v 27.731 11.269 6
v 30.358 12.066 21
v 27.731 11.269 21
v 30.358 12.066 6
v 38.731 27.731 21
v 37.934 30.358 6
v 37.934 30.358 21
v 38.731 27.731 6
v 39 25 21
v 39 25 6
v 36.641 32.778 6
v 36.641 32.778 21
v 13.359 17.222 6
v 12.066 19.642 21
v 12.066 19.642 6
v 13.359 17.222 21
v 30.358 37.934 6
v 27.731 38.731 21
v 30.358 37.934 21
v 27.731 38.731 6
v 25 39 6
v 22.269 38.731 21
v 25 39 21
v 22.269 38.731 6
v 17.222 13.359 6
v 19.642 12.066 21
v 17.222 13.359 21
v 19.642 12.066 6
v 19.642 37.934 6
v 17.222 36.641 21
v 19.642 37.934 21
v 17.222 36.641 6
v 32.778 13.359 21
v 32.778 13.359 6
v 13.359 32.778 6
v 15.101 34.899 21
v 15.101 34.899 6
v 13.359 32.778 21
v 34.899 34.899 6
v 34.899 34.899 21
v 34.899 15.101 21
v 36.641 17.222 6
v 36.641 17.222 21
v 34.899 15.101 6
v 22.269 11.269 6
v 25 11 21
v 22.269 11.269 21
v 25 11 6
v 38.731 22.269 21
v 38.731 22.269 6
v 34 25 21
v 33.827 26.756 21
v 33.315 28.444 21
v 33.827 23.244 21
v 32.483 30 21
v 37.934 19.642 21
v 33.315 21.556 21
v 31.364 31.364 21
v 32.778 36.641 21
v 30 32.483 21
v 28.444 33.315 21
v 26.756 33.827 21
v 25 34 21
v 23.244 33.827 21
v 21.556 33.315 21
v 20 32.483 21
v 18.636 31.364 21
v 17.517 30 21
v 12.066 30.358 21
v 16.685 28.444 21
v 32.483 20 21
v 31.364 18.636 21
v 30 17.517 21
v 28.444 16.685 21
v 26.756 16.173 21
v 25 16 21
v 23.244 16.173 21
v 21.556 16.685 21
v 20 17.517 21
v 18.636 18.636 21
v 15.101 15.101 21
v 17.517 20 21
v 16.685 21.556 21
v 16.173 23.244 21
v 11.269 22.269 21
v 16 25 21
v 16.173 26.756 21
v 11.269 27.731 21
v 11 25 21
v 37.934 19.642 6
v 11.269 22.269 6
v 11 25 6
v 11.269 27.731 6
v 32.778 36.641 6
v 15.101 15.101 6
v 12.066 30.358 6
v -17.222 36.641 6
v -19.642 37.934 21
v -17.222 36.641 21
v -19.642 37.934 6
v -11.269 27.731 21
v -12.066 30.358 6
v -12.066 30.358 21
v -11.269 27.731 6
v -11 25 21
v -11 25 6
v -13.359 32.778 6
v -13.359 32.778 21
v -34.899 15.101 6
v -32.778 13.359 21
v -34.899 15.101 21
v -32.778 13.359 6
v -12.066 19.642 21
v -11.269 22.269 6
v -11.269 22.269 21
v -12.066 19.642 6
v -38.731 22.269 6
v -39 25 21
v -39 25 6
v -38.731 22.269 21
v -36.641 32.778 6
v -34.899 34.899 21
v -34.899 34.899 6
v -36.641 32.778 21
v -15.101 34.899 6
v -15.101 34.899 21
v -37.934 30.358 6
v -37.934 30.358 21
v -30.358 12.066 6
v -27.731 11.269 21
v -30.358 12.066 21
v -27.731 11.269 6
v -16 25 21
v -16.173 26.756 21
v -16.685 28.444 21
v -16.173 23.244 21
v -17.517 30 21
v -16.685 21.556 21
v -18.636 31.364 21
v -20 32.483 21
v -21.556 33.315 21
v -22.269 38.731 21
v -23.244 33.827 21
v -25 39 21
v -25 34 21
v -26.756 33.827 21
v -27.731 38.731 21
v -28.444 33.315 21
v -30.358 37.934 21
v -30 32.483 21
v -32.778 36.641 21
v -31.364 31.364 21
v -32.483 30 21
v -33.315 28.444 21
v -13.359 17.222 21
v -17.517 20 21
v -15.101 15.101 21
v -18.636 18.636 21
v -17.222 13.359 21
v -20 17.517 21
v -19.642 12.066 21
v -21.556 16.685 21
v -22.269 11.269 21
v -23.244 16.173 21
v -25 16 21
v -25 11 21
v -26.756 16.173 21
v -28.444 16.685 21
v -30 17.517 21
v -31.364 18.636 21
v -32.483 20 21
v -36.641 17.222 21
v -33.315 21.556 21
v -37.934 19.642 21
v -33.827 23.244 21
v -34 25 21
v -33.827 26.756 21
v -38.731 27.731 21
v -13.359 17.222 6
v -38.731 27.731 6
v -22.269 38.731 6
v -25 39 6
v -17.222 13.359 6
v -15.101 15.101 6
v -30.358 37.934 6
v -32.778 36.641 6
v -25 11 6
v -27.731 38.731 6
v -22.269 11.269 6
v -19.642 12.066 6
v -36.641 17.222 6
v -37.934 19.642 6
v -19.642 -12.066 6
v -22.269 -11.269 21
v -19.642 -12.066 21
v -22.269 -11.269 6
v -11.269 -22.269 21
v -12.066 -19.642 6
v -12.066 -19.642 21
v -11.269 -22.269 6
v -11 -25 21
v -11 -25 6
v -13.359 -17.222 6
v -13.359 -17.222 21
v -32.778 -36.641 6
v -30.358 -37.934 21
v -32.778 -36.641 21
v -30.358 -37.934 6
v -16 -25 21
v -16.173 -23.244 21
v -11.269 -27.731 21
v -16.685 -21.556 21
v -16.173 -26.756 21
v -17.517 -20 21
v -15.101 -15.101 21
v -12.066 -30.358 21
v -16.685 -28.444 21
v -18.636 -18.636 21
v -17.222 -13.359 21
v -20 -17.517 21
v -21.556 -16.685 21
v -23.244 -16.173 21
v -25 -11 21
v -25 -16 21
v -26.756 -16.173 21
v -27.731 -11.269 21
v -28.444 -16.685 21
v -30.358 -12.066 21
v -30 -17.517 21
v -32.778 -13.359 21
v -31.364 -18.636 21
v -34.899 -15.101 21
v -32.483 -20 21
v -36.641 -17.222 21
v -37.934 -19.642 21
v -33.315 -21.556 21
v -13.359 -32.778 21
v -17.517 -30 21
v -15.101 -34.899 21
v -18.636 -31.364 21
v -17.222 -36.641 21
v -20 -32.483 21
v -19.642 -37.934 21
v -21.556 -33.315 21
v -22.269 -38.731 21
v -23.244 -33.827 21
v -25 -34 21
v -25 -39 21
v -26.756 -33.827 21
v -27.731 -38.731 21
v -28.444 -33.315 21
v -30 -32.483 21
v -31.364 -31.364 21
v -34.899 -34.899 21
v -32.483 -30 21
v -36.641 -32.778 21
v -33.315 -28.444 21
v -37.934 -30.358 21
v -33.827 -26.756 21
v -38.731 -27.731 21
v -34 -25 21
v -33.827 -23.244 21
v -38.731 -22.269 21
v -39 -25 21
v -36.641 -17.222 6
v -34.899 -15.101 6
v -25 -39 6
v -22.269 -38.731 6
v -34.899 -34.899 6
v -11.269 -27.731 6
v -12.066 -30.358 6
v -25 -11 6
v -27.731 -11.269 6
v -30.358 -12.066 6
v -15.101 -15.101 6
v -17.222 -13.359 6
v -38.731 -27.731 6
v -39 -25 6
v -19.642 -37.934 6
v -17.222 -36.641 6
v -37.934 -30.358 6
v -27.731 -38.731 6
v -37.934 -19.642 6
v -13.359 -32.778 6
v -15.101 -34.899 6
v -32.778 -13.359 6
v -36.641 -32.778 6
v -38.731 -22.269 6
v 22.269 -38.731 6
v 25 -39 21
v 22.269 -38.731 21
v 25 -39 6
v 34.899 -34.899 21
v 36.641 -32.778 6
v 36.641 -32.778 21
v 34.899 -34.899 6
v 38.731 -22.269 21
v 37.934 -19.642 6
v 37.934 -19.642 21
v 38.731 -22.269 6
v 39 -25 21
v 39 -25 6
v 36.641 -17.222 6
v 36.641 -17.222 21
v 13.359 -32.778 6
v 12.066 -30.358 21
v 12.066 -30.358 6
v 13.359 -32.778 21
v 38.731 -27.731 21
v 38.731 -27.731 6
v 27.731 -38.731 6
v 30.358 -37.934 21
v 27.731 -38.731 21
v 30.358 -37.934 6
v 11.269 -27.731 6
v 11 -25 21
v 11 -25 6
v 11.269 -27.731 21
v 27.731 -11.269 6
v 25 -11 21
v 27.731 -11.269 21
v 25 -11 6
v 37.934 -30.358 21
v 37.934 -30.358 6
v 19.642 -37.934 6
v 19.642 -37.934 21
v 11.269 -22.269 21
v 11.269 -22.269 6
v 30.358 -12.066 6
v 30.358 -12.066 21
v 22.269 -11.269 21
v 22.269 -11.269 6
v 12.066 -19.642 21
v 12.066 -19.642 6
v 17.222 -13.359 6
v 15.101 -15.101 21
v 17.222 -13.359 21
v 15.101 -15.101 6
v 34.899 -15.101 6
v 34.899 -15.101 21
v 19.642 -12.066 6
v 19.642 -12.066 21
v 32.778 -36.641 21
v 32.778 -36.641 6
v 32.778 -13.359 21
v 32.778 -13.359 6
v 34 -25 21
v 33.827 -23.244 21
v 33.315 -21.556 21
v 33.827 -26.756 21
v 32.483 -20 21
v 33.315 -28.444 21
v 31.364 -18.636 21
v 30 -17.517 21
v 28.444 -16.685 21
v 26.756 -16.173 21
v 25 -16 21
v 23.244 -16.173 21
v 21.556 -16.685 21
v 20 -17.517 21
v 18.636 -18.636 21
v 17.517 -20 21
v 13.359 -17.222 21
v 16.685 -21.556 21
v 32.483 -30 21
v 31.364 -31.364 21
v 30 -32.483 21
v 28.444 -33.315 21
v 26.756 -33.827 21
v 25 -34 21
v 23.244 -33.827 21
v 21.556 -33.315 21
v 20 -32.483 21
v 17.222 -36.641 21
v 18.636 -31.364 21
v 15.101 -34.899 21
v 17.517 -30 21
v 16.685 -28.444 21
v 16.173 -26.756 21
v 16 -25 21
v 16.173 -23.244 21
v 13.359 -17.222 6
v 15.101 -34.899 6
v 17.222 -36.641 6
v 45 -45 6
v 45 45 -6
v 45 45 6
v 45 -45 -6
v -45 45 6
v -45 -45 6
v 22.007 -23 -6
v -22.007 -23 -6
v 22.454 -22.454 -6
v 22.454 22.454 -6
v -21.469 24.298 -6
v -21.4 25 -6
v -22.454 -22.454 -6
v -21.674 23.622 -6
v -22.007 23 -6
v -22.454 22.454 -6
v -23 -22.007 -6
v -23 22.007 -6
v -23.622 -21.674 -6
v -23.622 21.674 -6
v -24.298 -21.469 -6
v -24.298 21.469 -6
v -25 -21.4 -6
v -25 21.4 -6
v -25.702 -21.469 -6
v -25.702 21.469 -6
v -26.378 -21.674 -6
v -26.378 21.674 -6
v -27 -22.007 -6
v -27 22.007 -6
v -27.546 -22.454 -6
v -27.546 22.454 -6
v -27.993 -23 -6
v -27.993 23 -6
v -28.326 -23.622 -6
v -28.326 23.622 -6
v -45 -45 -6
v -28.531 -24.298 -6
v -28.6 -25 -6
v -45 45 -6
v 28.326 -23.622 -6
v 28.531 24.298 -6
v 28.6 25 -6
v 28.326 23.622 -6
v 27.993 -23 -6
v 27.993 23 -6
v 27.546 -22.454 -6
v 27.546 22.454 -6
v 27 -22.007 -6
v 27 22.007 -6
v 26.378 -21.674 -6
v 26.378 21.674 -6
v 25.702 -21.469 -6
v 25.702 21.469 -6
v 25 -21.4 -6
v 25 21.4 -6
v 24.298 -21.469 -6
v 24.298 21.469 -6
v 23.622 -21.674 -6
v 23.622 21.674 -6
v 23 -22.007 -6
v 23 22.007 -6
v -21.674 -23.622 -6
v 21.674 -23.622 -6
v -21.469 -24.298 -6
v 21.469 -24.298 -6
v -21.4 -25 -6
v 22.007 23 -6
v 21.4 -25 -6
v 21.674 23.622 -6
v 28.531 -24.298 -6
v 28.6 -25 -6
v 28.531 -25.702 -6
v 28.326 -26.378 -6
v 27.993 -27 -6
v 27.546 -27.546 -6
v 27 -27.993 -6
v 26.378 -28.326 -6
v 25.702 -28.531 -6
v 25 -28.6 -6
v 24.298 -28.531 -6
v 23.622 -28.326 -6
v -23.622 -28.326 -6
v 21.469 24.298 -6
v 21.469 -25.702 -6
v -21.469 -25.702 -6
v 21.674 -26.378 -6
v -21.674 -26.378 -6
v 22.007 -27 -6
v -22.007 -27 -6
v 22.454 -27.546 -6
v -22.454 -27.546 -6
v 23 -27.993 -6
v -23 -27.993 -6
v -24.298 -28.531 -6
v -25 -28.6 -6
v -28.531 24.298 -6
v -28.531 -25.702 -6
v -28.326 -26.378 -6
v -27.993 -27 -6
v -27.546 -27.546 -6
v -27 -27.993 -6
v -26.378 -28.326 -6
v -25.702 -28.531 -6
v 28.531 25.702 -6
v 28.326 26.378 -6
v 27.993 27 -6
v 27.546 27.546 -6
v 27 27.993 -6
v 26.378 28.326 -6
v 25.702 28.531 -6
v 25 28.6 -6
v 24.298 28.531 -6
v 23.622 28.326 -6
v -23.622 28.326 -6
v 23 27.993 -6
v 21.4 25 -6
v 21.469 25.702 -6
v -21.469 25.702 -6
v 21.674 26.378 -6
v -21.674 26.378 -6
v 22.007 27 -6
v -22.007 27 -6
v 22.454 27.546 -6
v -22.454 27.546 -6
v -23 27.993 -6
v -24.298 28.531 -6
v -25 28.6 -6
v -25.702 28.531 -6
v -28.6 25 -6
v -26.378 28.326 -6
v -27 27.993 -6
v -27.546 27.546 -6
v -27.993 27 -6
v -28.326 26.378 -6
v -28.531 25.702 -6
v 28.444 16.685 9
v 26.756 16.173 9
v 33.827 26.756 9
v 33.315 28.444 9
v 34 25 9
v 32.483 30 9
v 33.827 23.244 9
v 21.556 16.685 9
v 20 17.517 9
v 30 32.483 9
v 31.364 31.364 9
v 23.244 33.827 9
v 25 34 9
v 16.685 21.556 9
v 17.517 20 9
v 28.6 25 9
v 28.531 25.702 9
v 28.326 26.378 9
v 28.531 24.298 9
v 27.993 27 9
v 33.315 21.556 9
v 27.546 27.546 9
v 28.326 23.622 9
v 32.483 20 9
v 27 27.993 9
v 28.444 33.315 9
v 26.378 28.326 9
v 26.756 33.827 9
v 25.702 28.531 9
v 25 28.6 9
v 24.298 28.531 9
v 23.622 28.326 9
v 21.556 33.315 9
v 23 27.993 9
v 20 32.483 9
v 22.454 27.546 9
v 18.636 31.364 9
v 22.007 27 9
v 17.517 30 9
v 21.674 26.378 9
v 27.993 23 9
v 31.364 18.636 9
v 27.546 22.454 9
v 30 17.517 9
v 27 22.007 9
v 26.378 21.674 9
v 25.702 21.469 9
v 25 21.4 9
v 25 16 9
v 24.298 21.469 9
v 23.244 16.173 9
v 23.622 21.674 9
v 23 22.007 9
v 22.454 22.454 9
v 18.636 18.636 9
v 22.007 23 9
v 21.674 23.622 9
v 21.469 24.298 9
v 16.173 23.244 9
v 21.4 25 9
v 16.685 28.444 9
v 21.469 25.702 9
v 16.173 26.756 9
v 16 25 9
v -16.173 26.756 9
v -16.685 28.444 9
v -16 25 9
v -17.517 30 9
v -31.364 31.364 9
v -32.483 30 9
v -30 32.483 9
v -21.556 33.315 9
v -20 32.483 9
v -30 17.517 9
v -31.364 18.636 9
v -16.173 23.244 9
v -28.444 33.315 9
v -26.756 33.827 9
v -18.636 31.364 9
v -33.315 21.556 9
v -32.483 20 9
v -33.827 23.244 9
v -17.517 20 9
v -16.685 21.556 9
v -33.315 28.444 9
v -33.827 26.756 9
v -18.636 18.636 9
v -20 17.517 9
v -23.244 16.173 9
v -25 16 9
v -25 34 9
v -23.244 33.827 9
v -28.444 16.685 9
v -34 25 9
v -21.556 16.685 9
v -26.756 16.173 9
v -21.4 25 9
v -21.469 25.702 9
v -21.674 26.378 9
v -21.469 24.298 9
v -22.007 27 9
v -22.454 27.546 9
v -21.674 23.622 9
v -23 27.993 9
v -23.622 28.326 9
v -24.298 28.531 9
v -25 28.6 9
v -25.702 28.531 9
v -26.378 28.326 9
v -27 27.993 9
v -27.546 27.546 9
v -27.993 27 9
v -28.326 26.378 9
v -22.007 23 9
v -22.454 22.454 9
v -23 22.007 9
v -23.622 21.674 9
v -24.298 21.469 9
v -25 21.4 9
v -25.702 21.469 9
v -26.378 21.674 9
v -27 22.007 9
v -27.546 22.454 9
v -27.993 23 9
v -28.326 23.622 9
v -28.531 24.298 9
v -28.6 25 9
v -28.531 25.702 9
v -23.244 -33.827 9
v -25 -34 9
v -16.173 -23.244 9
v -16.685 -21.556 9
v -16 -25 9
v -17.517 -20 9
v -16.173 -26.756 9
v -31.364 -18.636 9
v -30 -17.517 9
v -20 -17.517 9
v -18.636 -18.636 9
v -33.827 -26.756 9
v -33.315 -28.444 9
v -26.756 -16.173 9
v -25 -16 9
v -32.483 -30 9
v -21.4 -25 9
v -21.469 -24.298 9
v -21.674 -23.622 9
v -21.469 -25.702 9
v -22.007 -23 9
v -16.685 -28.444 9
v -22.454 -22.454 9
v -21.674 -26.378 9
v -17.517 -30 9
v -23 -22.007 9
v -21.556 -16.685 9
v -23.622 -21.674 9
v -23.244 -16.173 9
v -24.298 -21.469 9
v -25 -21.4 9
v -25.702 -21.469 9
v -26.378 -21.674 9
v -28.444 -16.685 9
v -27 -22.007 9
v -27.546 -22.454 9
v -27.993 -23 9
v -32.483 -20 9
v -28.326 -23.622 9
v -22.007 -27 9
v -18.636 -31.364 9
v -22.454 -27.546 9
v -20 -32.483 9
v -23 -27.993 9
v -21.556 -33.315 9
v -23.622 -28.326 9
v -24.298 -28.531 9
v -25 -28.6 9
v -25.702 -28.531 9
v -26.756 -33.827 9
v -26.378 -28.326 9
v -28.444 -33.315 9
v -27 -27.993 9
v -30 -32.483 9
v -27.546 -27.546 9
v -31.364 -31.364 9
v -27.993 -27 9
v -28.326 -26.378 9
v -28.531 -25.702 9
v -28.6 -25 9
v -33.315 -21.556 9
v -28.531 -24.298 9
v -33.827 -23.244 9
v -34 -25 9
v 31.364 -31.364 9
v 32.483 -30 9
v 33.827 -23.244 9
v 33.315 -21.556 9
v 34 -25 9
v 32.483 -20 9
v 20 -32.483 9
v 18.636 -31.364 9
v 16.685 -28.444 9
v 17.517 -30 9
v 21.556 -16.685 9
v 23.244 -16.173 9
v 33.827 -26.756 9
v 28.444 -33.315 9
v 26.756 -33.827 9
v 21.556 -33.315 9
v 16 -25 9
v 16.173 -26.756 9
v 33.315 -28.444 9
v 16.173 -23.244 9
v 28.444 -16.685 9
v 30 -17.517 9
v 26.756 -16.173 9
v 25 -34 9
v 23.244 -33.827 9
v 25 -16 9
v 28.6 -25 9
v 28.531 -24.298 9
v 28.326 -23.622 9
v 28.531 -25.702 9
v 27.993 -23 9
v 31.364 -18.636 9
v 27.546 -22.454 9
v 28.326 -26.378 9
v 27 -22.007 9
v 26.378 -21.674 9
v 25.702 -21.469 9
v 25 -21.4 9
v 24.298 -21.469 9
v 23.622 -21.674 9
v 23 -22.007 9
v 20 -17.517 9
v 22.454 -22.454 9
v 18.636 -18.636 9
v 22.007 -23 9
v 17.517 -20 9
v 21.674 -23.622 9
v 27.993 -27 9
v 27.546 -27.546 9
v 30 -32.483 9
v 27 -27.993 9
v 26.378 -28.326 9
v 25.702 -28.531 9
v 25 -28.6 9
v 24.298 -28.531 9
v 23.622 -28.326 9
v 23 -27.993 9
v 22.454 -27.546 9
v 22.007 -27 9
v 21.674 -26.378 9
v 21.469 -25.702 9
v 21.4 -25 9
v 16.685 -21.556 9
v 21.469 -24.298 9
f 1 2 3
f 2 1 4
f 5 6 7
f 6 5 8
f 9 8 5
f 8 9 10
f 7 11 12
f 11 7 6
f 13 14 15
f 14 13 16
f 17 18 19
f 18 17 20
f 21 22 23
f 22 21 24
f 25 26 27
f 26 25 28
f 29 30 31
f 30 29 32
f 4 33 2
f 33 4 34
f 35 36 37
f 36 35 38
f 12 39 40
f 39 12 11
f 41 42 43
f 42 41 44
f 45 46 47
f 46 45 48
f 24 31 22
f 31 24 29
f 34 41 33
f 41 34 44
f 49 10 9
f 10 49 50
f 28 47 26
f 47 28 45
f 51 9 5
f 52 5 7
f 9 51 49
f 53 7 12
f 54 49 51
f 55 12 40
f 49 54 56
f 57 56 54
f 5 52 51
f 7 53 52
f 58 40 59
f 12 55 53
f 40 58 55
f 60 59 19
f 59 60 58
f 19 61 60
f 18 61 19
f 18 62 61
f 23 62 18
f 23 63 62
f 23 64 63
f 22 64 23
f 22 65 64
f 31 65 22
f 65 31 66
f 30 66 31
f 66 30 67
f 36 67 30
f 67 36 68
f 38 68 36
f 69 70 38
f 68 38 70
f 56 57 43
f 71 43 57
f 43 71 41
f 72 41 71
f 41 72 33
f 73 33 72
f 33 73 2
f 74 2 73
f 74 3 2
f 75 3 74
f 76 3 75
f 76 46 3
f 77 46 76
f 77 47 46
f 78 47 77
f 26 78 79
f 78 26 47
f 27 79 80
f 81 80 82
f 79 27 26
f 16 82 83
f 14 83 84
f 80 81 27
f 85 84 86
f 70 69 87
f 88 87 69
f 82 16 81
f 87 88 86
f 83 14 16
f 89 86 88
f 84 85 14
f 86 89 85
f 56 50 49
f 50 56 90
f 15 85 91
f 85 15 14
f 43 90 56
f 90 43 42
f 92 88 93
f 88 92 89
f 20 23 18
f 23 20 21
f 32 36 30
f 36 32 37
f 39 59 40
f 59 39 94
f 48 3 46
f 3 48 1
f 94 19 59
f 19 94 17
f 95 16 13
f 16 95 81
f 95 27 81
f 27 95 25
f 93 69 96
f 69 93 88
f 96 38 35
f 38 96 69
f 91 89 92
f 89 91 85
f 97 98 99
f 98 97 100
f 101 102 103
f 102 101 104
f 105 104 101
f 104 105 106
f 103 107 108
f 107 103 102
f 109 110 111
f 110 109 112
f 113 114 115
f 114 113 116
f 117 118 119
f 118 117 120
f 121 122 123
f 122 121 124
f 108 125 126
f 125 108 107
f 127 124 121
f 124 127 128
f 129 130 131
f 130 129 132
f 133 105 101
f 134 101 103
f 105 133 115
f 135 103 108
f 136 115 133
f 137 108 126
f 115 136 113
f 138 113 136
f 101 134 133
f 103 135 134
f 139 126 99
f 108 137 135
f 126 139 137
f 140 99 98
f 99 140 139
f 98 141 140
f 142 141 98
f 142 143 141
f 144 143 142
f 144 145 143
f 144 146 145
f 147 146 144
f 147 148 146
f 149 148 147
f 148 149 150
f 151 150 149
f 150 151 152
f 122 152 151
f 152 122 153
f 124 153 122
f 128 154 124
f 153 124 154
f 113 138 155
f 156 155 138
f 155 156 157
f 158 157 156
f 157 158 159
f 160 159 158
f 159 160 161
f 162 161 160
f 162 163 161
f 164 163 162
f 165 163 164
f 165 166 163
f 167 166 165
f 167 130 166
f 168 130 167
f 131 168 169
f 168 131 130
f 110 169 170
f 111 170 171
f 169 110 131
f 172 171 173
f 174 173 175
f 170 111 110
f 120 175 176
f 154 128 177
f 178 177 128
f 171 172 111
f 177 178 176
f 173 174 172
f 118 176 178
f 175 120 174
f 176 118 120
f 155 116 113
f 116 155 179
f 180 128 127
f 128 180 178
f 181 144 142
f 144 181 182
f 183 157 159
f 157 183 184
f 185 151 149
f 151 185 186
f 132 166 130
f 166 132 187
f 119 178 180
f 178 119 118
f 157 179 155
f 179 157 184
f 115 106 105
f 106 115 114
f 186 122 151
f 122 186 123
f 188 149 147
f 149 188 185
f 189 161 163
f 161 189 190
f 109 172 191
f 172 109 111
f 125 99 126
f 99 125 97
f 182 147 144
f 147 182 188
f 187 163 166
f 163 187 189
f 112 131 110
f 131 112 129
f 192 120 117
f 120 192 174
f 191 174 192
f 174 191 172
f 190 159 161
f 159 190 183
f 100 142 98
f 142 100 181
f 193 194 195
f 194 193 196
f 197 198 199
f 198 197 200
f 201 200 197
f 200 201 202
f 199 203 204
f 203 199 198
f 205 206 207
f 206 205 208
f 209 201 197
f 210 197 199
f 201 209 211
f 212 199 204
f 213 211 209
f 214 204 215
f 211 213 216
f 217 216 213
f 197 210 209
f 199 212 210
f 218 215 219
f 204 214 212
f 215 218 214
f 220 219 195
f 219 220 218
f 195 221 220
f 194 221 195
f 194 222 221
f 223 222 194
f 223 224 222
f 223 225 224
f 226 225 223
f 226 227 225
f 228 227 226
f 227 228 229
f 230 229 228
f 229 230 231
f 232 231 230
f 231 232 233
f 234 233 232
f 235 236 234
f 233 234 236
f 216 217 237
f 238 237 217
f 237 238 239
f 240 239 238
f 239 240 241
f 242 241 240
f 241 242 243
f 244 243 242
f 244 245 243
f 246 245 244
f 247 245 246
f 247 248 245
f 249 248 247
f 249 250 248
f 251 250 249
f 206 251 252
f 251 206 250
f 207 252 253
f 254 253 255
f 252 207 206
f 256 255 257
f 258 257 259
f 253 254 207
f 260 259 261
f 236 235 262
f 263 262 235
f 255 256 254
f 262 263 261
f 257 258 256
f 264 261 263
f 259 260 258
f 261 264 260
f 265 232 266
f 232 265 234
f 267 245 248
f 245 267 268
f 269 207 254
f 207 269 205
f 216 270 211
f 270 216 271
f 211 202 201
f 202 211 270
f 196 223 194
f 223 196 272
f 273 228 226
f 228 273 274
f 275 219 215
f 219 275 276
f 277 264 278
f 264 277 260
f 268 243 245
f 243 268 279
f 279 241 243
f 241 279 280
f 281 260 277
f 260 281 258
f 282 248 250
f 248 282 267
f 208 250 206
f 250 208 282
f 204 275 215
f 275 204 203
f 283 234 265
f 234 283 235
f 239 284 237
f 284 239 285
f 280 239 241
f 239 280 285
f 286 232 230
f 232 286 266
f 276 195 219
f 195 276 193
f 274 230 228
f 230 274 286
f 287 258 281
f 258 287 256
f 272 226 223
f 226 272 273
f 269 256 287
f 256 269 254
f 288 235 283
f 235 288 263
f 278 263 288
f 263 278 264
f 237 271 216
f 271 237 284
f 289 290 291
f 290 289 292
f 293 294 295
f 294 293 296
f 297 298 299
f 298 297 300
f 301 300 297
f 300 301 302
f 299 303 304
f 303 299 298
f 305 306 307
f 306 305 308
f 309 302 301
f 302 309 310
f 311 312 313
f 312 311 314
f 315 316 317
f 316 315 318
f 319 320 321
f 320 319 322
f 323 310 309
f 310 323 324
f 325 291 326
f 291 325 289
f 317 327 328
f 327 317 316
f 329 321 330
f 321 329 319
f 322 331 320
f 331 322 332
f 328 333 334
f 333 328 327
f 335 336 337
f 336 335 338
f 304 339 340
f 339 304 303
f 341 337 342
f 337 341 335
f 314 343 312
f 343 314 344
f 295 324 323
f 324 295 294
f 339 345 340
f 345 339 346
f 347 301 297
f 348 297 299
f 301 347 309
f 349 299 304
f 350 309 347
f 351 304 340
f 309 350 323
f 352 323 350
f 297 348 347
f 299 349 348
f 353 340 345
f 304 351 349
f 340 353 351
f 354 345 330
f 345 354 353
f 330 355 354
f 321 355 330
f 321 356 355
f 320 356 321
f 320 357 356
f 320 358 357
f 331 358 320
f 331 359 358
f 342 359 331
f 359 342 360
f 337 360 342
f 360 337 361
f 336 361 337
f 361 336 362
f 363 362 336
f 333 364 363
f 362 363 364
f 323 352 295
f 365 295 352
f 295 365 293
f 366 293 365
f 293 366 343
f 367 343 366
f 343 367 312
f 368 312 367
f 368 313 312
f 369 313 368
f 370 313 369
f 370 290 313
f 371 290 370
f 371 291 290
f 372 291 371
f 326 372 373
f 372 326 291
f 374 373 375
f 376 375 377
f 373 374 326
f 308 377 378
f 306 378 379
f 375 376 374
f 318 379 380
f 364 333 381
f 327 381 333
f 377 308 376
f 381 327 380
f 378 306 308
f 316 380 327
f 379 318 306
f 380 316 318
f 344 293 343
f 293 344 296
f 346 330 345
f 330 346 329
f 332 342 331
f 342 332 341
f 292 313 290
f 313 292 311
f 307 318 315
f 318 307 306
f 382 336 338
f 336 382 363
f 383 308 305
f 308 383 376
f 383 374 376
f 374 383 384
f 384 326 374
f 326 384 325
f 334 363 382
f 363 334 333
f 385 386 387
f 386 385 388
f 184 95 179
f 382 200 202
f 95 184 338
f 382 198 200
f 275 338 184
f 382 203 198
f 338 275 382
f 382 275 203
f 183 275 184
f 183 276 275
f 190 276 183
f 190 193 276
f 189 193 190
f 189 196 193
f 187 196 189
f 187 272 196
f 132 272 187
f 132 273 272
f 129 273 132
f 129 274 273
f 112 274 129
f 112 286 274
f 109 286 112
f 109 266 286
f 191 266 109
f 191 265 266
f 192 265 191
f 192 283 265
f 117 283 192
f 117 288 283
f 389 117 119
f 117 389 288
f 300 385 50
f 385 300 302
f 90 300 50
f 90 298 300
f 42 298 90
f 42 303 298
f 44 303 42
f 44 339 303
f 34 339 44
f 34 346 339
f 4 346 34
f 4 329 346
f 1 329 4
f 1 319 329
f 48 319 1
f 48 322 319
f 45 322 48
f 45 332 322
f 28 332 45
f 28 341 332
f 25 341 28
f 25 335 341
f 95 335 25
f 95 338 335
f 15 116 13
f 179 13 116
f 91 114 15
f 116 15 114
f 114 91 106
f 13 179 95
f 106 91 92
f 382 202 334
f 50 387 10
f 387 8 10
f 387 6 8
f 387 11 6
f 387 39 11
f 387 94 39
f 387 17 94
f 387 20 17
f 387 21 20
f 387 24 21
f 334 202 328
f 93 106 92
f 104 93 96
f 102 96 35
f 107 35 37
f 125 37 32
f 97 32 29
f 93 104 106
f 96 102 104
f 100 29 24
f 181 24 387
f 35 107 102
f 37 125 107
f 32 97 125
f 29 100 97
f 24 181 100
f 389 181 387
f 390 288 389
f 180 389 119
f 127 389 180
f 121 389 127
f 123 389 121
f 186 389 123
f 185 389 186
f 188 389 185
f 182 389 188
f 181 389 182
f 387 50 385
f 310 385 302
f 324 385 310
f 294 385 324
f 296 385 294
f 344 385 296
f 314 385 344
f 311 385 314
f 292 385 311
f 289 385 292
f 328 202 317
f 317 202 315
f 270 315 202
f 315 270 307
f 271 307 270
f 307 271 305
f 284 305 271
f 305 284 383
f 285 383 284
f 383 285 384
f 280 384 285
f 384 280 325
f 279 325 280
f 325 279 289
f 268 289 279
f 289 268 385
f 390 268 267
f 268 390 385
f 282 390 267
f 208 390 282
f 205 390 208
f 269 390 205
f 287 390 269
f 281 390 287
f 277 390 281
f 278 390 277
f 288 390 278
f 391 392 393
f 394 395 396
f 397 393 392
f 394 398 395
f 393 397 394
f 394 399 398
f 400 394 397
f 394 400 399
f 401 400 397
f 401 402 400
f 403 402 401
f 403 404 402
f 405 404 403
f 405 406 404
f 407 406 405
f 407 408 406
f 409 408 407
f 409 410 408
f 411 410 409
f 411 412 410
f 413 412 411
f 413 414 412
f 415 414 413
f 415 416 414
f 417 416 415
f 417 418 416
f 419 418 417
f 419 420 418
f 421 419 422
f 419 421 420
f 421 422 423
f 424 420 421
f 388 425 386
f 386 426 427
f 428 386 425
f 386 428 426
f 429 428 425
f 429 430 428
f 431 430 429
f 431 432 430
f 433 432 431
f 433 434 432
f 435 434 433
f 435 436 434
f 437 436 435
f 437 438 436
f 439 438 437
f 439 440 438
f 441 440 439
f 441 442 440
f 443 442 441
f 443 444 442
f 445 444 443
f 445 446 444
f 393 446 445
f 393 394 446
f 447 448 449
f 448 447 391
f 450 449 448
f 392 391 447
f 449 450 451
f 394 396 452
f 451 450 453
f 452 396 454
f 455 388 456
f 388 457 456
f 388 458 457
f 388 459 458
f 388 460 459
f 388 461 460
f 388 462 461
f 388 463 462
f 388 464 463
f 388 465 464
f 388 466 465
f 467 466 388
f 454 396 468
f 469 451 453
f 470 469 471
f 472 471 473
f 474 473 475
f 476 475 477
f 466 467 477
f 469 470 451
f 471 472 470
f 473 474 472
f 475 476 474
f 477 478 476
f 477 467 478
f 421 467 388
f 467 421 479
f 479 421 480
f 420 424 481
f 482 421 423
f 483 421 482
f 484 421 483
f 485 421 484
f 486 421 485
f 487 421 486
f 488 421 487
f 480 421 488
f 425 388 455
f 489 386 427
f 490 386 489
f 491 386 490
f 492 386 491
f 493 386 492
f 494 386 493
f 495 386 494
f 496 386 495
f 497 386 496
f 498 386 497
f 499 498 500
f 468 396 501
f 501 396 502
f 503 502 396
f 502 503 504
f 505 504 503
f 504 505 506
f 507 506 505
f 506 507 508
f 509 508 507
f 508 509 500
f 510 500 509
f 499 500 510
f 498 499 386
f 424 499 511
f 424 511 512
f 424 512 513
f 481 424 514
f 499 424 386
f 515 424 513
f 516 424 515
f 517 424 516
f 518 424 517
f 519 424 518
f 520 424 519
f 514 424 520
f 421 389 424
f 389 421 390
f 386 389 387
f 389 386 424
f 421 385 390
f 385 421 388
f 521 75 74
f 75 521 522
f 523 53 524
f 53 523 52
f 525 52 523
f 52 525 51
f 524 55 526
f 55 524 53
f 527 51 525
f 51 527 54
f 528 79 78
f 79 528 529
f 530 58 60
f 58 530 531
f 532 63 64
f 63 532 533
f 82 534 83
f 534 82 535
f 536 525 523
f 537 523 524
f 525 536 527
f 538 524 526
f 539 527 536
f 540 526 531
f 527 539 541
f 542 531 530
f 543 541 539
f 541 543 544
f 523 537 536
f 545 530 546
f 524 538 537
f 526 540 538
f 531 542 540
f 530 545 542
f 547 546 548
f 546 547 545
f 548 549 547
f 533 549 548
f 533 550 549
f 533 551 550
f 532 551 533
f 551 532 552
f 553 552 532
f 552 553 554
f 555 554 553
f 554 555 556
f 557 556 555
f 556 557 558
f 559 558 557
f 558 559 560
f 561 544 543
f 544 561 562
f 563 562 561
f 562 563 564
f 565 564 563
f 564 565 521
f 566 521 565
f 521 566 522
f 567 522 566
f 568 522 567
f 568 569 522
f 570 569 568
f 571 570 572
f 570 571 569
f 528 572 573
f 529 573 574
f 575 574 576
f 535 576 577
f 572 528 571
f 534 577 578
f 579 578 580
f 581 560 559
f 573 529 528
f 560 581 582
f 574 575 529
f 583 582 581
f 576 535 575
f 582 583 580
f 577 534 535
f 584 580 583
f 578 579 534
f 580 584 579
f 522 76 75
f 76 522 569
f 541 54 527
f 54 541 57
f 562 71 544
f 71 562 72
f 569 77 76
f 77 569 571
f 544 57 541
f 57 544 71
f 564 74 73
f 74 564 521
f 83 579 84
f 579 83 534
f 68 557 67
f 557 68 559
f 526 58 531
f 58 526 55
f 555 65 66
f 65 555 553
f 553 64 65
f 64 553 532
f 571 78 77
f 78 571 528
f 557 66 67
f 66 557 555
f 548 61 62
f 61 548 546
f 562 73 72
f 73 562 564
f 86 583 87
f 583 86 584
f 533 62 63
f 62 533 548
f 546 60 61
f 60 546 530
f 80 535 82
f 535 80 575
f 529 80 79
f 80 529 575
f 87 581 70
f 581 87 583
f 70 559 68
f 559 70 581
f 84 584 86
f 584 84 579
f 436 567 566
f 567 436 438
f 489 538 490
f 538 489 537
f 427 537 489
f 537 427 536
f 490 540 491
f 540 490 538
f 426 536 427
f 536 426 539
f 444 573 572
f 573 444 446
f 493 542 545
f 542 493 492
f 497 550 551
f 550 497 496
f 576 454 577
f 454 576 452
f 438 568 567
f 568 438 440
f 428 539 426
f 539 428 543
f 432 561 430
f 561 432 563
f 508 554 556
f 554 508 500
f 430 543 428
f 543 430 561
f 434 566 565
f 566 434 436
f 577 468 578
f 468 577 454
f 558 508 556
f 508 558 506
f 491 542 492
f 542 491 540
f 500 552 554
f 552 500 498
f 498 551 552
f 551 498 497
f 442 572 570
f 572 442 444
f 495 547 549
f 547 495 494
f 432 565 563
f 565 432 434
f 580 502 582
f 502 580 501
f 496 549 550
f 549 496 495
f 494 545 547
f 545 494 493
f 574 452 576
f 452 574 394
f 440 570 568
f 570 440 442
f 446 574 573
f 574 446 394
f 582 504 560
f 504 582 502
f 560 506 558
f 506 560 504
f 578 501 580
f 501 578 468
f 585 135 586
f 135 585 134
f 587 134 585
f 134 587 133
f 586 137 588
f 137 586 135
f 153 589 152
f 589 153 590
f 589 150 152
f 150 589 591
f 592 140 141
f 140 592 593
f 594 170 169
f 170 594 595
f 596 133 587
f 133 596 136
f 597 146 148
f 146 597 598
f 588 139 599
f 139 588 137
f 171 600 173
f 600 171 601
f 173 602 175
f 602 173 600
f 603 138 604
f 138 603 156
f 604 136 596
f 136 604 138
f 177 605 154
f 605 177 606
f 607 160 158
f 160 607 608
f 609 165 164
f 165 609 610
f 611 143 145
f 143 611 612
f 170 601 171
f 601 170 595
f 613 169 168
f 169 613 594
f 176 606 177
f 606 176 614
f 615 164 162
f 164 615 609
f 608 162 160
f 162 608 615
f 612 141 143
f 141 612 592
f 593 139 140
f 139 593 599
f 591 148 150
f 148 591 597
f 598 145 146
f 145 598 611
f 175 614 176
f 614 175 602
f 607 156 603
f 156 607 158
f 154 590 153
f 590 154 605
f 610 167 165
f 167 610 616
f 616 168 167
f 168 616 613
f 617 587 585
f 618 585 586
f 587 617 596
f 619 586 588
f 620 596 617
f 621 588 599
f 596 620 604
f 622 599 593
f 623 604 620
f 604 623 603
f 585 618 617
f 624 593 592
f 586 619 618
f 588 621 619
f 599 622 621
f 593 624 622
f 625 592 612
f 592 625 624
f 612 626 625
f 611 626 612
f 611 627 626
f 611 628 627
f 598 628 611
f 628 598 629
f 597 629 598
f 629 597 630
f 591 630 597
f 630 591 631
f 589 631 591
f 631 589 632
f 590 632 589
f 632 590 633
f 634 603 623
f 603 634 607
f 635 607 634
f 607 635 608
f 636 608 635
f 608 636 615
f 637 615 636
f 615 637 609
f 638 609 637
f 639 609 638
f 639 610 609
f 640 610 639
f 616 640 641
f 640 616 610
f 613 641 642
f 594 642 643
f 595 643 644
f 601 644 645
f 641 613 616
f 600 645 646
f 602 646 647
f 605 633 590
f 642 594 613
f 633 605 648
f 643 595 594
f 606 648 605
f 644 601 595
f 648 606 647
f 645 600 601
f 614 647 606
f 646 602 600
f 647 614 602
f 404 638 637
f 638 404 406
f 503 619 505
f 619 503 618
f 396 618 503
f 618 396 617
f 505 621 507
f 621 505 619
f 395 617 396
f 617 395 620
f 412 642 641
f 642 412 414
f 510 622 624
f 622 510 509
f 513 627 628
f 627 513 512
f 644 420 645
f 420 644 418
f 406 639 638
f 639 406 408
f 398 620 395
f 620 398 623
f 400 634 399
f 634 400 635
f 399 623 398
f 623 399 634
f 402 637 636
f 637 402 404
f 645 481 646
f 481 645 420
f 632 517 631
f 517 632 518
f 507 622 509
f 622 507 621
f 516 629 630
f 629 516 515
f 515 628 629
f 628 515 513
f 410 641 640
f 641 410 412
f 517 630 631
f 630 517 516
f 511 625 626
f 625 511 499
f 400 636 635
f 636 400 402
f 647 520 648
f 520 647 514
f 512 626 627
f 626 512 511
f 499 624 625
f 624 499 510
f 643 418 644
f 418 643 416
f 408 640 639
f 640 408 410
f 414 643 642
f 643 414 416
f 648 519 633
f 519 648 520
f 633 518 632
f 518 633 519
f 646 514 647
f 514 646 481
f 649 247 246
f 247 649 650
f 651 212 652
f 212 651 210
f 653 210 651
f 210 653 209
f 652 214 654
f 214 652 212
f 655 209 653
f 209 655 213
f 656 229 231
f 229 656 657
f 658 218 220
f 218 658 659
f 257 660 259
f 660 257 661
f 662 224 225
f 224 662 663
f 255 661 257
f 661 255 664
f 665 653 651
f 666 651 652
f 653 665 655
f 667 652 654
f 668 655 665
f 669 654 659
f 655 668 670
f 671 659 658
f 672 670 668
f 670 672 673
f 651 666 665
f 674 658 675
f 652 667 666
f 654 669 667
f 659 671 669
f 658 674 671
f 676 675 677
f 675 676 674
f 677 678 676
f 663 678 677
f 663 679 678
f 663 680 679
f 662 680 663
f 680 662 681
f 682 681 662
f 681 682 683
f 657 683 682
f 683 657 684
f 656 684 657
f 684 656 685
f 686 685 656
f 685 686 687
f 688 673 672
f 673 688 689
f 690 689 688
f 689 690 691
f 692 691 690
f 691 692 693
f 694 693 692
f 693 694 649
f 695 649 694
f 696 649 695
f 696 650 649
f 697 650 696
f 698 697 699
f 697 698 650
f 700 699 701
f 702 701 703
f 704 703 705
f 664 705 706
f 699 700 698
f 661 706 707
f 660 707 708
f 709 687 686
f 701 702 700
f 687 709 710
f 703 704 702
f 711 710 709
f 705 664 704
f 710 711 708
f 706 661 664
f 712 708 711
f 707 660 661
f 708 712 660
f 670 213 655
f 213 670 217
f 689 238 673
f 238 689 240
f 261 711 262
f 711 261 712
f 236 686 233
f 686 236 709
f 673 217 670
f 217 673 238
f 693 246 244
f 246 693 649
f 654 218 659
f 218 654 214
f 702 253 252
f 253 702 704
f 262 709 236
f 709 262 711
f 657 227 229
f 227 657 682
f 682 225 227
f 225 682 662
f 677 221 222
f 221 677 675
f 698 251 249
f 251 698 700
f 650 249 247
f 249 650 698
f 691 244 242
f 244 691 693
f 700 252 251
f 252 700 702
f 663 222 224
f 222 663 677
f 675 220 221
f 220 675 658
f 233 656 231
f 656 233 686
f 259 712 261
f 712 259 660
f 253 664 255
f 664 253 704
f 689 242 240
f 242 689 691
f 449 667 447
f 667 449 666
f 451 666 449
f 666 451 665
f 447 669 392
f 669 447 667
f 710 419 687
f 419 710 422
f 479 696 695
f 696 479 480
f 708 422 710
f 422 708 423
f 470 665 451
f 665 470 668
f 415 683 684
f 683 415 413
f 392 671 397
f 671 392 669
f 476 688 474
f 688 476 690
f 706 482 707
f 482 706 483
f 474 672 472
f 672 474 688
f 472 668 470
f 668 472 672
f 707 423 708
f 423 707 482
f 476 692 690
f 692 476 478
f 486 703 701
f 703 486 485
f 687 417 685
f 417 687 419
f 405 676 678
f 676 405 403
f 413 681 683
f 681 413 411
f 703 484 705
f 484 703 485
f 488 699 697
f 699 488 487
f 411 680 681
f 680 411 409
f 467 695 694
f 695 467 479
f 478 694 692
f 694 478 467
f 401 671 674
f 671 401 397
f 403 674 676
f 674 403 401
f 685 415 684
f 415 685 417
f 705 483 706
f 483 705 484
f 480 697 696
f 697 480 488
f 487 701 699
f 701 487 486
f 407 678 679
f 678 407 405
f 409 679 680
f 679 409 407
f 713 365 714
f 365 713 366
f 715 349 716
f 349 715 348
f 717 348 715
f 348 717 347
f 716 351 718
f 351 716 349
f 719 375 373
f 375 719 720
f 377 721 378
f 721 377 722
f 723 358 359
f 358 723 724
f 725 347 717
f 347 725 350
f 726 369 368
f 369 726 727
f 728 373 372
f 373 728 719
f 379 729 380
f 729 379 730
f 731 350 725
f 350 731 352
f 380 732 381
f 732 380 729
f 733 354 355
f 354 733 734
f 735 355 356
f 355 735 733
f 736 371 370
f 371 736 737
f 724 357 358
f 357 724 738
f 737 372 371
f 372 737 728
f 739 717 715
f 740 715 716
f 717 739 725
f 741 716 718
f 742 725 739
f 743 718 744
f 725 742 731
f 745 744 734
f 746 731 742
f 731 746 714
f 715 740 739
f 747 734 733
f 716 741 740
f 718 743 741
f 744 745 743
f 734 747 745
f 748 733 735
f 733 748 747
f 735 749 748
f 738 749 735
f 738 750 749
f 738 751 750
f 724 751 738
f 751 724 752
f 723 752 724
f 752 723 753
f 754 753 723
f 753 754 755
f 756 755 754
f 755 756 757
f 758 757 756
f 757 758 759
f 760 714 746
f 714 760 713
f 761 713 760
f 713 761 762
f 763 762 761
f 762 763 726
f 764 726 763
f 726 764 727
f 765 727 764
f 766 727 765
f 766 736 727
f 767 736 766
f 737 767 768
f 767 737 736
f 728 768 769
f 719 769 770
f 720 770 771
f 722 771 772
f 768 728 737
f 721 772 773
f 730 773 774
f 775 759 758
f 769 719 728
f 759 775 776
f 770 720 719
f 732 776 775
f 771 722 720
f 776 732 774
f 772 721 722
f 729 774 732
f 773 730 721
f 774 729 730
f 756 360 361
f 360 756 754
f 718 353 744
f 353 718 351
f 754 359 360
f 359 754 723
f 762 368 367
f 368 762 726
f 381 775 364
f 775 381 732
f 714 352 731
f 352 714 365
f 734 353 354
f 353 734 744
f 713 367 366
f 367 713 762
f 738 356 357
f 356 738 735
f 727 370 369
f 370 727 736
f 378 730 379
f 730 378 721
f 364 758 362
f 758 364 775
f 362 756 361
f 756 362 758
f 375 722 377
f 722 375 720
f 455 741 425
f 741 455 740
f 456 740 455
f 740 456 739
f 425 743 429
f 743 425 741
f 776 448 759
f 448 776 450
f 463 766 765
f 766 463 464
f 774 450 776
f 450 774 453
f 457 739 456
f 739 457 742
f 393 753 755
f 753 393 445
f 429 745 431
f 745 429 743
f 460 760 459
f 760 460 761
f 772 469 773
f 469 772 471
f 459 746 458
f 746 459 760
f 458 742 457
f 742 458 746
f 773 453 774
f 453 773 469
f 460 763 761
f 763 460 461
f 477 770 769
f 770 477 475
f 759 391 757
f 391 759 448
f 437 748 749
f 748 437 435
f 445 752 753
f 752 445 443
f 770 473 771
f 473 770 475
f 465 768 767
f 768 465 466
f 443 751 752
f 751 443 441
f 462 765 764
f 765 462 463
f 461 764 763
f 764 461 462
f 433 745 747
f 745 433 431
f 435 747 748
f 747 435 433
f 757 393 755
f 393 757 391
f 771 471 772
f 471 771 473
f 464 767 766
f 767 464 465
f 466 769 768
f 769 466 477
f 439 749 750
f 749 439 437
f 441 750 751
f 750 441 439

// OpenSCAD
$fn = 32;

// ----------------------------------------------------------------------
// Socket pad plate
// bosses with counterbored sockets for the screws
// ----------------------------------------------------------------------

// --- parameters (mm) ---
base_t = 12;           // base plate thickness
boss_h = 15;           // boss height above the base plate
boss_d = 28;           // boss diameter
socket_d = 18;         // socket diameter
socket_depth = 12;     // socket depth from the boss face
bolt_d = 7.2;          // screw clearance hole through the socket floor
plate = [90, 90, 12];  // overall size (x, y, z)
edge = 20;             // boss centre offset from the plate edge
pads = 4;              // boss count, one per corner

// --- derived feature positions (mm) ---
height = base_t + boss_h;        // = 27   overall height of the part
corner_x = plate[0] / 2 - edge;  // = 25   boss centre X
corner_y = plate[1] / 2 - edge;  // = 25   boss centre Y
feature_centers = [
  [corner_x, corner_y],
  [-corner_x, corner_y],
  [-corner_x, -corner_y],
  [corner_x, -corner_y]
];   // boss centres: sockets, holes and the pads themselves are placed from here

// base plate, bosses on feature_centers, socket + through hole in each
difference() {
  union() {
    cube(plate, center = true);
    for (centre = feature_centers)
      translate([centre[0], centre[1], plate[2] / 2 - 1])
        cylinder(d = boss_d, h = boss_h + 1);
  }
  for (centre = feature_centers) {
    translate([centre[0], centre[1], plate[2] / 2 + boss_h - socket_depth])
      cylinder(d = socket_d, h = socket_depth + 1);
    translate([centre[0], centre[1], -height])
      cylinder(d = bolt_d, h = 2 * height + 2);  // through the socket floor
  }
}
